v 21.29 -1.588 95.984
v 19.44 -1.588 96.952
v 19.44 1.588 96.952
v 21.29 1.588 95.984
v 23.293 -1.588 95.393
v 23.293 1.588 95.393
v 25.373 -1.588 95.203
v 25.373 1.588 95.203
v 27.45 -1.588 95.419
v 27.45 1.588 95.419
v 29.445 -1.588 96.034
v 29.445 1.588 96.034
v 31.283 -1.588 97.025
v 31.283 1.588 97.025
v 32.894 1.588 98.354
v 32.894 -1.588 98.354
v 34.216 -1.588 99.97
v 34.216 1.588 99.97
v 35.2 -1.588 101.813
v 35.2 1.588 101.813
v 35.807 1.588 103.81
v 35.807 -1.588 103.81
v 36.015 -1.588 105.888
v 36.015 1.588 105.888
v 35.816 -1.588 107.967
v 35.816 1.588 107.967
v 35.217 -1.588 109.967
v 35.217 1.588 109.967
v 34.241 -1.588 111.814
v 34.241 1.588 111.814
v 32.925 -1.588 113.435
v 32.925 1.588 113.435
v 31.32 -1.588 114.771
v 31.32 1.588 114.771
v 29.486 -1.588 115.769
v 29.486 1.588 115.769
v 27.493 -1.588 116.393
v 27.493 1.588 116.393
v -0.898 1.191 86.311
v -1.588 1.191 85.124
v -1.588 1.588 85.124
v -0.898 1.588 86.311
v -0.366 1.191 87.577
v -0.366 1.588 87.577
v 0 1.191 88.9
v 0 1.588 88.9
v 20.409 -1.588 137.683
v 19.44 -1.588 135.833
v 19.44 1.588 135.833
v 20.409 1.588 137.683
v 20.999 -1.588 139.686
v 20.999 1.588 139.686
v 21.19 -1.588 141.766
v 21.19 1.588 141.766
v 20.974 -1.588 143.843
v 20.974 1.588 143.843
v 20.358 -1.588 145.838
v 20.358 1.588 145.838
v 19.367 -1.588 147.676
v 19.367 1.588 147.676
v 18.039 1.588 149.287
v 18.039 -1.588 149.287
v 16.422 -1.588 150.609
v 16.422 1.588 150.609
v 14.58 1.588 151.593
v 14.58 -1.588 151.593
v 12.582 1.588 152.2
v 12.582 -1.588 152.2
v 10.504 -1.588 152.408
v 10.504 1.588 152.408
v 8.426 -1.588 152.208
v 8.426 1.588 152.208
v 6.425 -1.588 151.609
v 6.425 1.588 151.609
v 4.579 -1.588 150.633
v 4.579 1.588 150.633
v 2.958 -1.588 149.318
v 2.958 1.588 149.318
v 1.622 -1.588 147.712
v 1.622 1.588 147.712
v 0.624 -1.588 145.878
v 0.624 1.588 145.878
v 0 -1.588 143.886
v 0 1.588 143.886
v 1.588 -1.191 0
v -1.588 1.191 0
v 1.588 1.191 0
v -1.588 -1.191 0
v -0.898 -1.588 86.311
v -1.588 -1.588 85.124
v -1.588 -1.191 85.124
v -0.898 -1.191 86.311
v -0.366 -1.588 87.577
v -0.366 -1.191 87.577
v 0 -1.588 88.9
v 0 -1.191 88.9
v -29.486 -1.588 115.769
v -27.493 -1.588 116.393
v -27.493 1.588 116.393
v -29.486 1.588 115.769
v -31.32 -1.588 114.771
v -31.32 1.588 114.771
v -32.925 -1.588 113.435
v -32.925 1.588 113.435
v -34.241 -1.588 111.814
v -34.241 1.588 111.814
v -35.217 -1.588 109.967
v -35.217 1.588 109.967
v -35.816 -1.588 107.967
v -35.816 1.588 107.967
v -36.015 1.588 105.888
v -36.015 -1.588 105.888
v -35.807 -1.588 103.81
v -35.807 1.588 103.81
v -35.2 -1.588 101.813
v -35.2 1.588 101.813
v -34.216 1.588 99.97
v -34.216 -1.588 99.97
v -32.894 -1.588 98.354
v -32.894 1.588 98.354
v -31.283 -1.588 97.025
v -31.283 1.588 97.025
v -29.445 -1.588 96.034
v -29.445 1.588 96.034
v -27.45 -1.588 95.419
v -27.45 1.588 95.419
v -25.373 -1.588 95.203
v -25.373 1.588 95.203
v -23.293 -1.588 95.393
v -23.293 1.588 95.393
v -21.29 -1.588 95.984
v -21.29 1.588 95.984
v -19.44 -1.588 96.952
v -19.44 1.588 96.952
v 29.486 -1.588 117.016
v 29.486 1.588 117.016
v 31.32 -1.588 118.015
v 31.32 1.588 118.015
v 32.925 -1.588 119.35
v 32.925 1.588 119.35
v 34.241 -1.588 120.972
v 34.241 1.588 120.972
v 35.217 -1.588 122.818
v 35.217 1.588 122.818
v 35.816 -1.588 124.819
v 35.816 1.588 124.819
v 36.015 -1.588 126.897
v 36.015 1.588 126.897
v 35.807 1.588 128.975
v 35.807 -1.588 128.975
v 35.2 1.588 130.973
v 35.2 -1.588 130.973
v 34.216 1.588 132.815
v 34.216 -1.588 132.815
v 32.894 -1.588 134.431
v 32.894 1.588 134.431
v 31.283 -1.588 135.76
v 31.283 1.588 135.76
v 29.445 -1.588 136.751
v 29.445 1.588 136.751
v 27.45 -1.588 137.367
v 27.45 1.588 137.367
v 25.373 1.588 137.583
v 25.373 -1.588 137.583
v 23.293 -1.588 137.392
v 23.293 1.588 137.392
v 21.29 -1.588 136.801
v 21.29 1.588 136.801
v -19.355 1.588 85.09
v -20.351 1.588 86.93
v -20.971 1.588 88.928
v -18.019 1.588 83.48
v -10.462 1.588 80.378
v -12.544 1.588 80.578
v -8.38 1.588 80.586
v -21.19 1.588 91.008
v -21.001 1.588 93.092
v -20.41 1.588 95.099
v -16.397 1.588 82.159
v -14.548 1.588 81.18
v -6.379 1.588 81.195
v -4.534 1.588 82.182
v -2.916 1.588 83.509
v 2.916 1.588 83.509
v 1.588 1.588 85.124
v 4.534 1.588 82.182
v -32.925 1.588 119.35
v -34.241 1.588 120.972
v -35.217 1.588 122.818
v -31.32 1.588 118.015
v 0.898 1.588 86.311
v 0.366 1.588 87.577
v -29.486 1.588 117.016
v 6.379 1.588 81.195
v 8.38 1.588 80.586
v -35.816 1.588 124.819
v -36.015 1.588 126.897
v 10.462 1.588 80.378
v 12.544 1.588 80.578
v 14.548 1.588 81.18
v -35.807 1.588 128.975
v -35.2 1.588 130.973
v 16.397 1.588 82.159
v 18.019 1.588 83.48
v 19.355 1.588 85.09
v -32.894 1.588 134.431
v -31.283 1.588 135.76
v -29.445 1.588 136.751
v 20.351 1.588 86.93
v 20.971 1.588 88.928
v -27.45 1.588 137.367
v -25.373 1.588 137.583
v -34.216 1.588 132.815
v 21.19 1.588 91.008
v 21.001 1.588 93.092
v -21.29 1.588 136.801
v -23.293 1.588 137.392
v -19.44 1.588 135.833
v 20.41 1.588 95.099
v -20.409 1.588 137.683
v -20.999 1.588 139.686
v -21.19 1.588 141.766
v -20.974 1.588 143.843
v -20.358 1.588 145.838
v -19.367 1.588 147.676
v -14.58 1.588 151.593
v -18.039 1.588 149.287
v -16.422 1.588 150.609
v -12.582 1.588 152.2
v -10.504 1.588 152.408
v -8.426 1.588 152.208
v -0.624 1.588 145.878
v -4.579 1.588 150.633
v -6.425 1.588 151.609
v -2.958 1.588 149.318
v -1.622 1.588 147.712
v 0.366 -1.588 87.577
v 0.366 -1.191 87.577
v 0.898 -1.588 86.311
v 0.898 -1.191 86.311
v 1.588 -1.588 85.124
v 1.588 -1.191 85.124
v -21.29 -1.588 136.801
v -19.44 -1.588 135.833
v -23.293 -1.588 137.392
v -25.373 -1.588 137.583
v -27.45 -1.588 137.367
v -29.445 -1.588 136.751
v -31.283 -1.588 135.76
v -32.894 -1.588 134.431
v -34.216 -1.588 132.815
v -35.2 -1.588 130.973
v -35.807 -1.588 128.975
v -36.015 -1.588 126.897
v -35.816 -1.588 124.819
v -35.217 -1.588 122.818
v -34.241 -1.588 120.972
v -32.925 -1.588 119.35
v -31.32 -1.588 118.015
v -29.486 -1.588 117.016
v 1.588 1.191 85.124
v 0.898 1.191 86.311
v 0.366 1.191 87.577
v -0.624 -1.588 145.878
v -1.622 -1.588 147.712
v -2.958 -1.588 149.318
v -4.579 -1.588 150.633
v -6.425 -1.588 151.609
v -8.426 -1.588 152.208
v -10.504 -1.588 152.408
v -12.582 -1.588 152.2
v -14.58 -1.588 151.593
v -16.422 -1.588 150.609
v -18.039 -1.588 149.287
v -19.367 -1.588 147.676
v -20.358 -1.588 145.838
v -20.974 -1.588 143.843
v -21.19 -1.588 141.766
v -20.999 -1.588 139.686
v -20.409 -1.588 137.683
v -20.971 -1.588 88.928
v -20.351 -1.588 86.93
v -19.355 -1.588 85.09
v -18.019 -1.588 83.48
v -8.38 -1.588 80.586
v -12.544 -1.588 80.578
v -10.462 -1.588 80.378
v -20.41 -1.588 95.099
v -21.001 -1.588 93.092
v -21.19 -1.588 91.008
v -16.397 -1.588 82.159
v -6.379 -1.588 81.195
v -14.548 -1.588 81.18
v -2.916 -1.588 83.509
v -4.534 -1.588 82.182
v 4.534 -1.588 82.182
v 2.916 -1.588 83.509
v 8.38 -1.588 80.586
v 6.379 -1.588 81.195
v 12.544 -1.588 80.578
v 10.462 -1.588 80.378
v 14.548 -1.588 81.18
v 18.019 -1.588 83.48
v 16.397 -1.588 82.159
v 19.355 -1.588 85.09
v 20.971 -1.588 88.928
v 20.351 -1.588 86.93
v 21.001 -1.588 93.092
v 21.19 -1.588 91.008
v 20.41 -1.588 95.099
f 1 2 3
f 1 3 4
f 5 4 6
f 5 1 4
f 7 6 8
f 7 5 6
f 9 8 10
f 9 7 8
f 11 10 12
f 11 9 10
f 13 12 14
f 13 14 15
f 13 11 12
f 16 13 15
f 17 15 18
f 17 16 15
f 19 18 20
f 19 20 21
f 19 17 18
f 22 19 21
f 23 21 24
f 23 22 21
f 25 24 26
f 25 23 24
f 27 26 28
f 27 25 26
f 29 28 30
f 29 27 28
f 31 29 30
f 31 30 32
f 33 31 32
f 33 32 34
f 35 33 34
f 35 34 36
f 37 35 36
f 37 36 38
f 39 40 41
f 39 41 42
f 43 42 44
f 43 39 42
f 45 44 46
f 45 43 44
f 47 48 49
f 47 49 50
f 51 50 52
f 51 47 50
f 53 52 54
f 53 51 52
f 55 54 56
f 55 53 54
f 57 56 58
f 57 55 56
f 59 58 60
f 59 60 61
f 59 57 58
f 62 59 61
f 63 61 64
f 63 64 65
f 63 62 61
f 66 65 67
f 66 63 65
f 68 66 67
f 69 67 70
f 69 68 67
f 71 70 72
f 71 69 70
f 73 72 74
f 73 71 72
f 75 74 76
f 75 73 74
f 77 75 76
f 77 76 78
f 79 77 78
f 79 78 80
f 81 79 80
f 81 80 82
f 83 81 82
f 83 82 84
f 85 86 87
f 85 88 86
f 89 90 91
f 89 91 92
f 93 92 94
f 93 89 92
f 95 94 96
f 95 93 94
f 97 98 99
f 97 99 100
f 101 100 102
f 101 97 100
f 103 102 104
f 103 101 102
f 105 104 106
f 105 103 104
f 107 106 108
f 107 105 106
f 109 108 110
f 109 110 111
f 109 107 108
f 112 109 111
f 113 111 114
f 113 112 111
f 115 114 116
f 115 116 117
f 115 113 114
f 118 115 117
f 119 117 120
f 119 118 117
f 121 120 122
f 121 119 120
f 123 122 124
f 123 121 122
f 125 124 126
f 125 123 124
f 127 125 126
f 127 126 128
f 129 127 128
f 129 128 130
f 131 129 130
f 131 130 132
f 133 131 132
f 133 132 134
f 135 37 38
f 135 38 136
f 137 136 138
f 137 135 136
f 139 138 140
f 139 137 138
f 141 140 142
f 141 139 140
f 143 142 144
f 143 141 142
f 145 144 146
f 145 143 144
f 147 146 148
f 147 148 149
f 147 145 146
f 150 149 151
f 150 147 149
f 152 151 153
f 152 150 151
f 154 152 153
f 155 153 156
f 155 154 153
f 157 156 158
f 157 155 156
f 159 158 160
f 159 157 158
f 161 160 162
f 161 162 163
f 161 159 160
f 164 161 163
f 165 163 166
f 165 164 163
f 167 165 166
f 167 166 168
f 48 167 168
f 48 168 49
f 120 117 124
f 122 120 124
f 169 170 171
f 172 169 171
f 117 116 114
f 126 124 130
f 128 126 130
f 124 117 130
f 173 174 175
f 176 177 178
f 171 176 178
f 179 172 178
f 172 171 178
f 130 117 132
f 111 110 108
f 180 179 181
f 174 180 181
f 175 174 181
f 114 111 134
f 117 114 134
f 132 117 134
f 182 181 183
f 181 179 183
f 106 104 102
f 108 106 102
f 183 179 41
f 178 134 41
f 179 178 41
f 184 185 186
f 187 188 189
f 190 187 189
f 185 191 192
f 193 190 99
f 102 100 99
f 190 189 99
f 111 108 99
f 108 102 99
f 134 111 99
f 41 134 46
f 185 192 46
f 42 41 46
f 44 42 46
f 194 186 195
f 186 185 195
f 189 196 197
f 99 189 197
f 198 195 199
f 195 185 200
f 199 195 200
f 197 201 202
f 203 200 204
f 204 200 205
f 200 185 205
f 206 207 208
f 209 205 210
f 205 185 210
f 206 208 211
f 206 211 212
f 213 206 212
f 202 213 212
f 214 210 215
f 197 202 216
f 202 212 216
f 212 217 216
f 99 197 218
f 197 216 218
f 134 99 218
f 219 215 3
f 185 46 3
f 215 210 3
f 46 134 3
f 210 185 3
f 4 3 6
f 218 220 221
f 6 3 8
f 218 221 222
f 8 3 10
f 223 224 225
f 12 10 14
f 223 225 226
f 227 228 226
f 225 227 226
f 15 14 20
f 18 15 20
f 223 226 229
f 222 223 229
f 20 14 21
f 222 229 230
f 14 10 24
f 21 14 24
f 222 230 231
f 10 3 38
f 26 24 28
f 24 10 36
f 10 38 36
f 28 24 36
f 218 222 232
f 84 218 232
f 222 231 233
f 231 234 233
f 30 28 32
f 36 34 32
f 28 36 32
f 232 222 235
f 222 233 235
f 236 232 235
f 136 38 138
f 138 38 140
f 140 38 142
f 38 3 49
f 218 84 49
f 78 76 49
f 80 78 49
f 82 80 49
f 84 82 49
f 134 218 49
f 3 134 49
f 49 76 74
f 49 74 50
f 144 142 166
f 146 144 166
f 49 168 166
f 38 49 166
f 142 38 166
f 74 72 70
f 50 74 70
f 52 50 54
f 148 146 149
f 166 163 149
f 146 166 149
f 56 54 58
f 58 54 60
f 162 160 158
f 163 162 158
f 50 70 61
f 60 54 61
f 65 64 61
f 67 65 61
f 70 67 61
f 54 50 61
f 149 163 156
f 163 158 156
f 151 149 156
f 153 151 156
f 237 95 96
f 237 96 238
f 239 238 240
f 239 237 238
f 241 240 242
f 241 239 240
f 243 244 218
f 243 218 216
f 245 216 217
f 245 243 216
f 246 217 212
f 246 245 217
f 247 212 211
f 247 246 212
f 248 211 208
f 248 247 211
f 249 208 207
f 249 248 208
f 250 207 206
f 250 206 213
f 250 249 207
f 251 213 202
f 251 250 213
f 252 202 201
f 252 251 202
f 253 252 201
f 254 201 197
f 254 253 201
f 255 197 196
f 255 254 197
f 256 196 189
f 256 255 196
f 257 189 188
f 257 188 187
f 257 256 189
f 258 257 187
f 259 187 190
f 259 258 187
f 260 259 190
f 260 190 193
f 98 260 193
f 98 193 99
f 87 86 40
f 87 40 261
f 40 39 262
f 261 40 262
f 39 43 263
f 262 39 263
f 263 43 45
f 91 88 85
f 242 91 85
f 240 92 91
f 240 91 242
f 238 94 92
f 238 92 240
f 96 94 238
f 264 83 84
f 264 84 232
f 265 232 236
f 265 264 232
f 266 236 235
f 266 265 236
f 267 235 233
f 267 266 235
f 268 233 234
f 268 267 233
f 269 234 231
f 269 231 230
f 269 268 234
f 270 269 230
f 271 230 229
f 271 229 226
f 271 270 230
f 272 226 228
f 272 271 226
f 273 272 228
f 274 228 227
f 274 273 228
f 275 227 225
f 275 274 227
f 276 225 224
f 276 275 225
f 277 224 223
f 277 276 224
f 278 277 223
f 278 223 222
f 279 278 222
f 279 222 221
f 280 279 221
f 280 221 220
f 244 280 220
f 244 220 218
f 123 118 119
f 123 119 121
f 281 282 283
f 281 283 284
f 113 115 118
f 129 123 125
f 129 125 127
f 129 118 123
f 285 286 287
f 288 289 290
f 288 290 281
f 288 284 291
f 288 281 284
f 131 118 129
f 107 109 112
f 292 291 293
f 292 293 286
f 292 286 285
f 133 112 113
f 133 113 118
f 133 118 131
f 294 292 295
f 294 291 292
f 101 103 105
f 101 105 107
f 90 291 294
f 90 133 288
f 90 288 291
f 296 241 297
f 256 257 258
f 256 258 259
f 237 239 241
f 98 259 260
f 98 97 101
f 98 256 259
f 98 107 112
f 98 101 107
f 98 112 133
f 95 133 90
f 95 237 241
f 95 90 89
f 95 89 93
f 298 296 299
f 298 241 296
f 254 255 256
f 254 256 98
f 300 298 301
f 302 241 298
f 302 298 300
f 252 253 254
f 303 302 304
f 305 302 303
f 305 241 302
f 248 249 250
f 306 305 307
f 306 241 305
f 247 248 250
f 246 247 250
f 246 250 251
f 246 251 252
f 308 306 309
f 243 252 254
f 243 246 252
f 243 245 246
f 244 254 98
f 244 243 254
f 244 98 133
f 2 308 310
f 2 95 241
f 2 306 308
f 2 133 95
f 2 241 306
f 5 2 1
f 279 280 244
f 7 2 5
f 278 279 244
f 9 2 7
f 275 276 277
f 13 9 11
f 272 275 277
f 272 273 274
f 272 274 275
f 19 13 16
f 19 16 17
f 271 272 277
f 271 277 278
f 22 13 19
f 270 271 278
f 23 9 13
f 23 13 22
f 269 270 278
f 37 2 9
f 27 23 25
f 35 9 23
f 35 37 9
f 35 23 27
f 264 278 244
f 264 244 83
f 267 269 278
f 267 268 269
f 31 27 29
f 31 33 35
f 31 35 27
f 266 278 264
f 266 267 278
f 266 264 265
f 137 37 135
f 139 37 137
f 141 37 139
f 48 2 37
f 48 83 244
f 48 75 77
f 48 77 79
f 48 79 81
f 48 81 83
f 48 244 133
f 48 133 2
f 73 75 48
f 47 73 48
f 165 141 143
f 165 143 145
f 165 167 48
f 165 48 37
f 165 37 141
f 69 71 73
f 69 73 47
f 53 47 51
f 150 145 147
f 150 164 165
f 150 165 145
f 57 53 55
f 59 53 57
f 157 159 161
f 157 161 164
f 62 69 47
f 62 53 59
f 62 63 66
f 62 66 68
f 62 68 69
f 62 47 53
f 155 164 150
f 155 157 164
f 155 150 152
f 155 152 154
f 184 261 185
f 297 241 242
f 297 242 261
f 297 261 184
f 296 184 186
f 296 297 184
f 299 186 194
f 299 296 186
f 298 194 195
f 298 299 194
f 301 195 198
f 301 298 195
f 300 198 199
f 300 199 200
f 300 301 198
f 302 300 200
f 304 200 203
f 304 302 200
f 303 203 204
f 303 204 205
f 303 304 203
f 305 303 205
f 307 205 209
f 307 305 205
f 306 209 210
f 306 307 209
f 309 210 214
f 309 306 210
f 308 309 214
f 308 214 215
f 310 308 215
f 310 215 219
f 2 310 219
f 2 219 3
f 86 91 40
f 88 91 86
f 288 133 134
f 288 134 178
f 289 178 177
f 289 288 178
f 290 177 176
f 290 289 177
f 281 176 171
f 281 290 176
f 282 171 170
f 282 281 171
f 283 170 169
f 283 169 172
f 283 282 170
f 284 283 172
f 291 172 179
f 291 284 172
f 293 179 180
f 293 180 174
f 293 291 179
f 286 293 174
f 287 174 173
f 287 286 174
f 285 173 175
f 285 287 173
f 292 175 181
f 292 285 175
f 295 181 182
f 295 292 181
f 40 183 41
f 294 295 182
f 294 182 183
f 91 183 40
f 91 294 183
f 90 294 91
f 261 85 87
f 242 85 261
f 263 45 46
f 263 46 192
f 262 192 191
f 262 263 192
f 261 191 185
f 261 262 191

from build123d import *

# Parameters (mm, degrees)
F1_DEPTH = 1.5875
F2_DEPTH = 1.190625


with BuildPart() as f1:
    # F0 (on Front) → F1 (new body, symmetric)
    with BuildSketch(Plane.XZ):
        Polygon((-19.440318, 96.952444), (0, 88.9), (19.440318, 96.952444), (27.492762, 116.392762), (19.440318, 135.83308), (0, 143.885524), (-19.440318, 135.83308), (-27.492762, 116.392762), align=None)
        with BuildLine():
            Line((1.5875, 88.9), (1.5875, 85.124308))
            ThreePointArc((1.5875, 85.124308), (16.396635, 82.159273), (19.440318, 96.952444))
            Line((19.440318, 96.952444), (0, 88.9))
            Line((0, 88.9), (1.5875, 88.9))
        make_face()
        with BuildLine():
            Line((27.492762, 116.392762), (19.440318, 96.952444))
            ThreePointArc((19.440318, 96.952444), (35.19981, 101.812523), (27.492762, 116.392762))
        make_face()
        with BuildLine():
            Line((19.440318, 135.83308), (27.492762, 116.392762))
            ThreePointArc((27.492762, 116.392762), (35.19981, 130.973001), (19.440318, 135.83308))
        make_face()
        with BuildLine():
            Line((0, 143.885524), (19.440318, 135.83308))
            ThreePointArc((19.440318, 135.83308), (14.580239, 151.592572), (0, 143.885524))
        make_face()
        with BuildLine():
            ThreePointArc((0, 143.885524), (-14.580239, 151.592572), (-19.440318, 135.83308))
            Line((-19.440318, 135.83308), (0, 143.885524))
        make_face()
        with BuildLine():
            ThreePointArc((-19.440318, 135.83308), (-35.19981, 130.973001), (-27.492762, 116.392762))
            Line((-27.492762, 116.392762), (-19.440318, 135.83308))
        make_face()
        with BuildLine():
            ThreePointArc((-27.492762, 116.392762), (-35.19981, 101.812523), (-19.440318, 96.952444))
            Line((-19.440318, 96.952444), (-27.492762, 116.392762))
        make_face()
        with BuildLine():
            Line((-1.5875, 88.9), (0, 88.9))
            Line((0, 88.9), (-19.440318, 96.952444))
            ThreePointArc((-19.440318, 96.952444), (-16.396635, 82.159273), (-1.5875, 85.124308))
            Line((-1.5875, 85.124308), (-1.5875, 88.9))
        make_face()
        with BuildLine():
            ThreePointArc((0, 88.9), (0.61154, 86.935543), (1.5875, 85.124308))
            Line((1.5875, 85.124308), (1.5875, 88.9))
            Line((1.5875, 88.9), (0, 88.9))
        make_face()
        with BuildLine():
            ThreePointArc((-1.5875, 85.124308), (-0.61154, 86.935543), (0, 88.9))
            Line((0, 88.9), (-1.5875, 88.9))
            Line((-1.5875, 88.9), (-1.5875, 85.124308))
        make_face()
    extrude(amount=F1_DEPTH, both=True)

    # F0 (on Front) → F2 (join, symmetric)
    with BuildSketch(Plane.XZ):
        with BuildLine():
            Line((-1.5875, 0), (1.5875, 0))
            Line((1.5875, 0), (1.5875, 85.124308))
            ThreePointArc((1.5875, 85.124308), (0.61154, 86.935543), (0, 88.9))
            ThreePointArc((0, 88.9), (-0.61154, 86.935543), (-1.5875, 85.124308))
            Line((-1.5875, 85.124308), (-1.5875, 0))
        make_face()
    extrude(amount=F2_DEPTH, both=True)


solid = f1.part
